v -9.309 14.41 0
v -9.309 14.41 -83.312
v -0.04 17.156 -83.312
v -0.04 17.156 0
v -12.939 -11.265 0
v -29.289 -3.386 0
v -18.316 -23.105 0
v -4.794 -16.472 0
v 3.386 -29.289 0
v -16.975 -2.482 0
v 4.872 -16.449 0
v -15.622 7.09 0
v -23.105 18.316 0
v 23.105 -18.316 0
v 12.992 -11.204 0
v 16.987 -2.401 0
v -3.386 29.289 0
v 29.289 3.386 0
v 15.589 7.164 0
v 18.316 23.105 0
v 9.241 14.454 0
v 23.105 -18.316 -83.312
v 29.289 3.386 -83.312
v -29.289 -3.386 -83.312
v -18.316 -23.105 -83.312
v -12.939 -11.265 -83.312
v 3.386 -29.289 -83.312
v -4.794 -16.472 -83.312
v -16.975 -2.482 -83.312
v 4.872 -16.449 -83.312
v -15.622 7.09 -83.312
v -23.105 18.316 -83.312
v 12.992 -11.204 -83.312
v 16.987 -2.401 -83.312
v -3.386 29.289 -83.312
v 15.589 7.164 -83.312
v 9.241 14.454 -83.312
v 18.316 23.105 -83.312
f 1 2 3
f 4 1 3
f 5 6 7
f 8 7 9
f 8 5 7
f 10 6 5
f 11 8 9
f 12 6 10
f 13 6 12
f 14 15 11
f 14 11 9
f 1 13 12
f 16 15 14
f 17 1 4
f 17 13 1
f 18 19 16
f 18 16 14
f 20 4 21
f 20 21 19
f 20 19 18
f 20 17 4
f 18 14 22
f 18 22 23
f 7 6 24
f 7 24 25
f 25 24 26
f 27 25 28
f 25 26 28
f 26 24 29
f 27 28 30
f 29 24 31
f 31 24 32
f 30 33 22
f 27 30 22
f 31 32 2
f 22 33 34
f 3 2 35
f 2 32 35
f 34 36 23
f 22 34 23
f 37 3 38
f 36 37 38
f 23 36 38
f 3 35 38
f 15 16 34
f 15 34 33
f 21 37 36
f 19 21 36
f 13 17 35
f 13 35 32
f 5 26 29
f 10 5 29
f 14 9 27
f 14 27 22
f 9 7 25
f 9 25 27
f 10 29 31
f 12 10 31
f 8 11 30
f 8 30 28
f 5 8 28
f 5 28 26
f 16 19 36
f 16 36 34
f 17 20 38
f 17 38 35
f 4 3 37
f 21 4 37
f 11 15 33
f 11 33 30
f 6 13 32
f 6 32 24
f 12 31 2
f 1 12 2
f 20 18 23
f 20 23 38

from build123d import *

# Parameters (mm, degrees)
F1_DEPTH = 83.312


with BuildPart() as f1:
    # F0 (on Top) → F1 (new body)
    with BuildSketch(Plane.XY):
        Polygon((3.386476, -29.289481), (23.10539, -18.316191), (29.289481, 3.386476), (18.316191, 23.10539), (-3.386476, 29.289481), (-23.10539, 18.316191), (-29.289481, -3.386476), (-18.316191, -23.10539), align=None)
        Polygon((-15.622193, 7.089933), (-9.309118, 14.410427), (-0.040463, 17.155711), (9.241038, 14.454179), (15.588575, 7.163547), (16.98685, -2.401461), (12.991919, -11.204022), (4.872147, -16.449385), (-4.794498, -16.472184), (-12.938924, -11.265182), (-16.975333, -2.481564), align=None, mode=Mode.SUBTRACT)
    extrude(amount=-F1_DEPTH)


solid = f1.part
